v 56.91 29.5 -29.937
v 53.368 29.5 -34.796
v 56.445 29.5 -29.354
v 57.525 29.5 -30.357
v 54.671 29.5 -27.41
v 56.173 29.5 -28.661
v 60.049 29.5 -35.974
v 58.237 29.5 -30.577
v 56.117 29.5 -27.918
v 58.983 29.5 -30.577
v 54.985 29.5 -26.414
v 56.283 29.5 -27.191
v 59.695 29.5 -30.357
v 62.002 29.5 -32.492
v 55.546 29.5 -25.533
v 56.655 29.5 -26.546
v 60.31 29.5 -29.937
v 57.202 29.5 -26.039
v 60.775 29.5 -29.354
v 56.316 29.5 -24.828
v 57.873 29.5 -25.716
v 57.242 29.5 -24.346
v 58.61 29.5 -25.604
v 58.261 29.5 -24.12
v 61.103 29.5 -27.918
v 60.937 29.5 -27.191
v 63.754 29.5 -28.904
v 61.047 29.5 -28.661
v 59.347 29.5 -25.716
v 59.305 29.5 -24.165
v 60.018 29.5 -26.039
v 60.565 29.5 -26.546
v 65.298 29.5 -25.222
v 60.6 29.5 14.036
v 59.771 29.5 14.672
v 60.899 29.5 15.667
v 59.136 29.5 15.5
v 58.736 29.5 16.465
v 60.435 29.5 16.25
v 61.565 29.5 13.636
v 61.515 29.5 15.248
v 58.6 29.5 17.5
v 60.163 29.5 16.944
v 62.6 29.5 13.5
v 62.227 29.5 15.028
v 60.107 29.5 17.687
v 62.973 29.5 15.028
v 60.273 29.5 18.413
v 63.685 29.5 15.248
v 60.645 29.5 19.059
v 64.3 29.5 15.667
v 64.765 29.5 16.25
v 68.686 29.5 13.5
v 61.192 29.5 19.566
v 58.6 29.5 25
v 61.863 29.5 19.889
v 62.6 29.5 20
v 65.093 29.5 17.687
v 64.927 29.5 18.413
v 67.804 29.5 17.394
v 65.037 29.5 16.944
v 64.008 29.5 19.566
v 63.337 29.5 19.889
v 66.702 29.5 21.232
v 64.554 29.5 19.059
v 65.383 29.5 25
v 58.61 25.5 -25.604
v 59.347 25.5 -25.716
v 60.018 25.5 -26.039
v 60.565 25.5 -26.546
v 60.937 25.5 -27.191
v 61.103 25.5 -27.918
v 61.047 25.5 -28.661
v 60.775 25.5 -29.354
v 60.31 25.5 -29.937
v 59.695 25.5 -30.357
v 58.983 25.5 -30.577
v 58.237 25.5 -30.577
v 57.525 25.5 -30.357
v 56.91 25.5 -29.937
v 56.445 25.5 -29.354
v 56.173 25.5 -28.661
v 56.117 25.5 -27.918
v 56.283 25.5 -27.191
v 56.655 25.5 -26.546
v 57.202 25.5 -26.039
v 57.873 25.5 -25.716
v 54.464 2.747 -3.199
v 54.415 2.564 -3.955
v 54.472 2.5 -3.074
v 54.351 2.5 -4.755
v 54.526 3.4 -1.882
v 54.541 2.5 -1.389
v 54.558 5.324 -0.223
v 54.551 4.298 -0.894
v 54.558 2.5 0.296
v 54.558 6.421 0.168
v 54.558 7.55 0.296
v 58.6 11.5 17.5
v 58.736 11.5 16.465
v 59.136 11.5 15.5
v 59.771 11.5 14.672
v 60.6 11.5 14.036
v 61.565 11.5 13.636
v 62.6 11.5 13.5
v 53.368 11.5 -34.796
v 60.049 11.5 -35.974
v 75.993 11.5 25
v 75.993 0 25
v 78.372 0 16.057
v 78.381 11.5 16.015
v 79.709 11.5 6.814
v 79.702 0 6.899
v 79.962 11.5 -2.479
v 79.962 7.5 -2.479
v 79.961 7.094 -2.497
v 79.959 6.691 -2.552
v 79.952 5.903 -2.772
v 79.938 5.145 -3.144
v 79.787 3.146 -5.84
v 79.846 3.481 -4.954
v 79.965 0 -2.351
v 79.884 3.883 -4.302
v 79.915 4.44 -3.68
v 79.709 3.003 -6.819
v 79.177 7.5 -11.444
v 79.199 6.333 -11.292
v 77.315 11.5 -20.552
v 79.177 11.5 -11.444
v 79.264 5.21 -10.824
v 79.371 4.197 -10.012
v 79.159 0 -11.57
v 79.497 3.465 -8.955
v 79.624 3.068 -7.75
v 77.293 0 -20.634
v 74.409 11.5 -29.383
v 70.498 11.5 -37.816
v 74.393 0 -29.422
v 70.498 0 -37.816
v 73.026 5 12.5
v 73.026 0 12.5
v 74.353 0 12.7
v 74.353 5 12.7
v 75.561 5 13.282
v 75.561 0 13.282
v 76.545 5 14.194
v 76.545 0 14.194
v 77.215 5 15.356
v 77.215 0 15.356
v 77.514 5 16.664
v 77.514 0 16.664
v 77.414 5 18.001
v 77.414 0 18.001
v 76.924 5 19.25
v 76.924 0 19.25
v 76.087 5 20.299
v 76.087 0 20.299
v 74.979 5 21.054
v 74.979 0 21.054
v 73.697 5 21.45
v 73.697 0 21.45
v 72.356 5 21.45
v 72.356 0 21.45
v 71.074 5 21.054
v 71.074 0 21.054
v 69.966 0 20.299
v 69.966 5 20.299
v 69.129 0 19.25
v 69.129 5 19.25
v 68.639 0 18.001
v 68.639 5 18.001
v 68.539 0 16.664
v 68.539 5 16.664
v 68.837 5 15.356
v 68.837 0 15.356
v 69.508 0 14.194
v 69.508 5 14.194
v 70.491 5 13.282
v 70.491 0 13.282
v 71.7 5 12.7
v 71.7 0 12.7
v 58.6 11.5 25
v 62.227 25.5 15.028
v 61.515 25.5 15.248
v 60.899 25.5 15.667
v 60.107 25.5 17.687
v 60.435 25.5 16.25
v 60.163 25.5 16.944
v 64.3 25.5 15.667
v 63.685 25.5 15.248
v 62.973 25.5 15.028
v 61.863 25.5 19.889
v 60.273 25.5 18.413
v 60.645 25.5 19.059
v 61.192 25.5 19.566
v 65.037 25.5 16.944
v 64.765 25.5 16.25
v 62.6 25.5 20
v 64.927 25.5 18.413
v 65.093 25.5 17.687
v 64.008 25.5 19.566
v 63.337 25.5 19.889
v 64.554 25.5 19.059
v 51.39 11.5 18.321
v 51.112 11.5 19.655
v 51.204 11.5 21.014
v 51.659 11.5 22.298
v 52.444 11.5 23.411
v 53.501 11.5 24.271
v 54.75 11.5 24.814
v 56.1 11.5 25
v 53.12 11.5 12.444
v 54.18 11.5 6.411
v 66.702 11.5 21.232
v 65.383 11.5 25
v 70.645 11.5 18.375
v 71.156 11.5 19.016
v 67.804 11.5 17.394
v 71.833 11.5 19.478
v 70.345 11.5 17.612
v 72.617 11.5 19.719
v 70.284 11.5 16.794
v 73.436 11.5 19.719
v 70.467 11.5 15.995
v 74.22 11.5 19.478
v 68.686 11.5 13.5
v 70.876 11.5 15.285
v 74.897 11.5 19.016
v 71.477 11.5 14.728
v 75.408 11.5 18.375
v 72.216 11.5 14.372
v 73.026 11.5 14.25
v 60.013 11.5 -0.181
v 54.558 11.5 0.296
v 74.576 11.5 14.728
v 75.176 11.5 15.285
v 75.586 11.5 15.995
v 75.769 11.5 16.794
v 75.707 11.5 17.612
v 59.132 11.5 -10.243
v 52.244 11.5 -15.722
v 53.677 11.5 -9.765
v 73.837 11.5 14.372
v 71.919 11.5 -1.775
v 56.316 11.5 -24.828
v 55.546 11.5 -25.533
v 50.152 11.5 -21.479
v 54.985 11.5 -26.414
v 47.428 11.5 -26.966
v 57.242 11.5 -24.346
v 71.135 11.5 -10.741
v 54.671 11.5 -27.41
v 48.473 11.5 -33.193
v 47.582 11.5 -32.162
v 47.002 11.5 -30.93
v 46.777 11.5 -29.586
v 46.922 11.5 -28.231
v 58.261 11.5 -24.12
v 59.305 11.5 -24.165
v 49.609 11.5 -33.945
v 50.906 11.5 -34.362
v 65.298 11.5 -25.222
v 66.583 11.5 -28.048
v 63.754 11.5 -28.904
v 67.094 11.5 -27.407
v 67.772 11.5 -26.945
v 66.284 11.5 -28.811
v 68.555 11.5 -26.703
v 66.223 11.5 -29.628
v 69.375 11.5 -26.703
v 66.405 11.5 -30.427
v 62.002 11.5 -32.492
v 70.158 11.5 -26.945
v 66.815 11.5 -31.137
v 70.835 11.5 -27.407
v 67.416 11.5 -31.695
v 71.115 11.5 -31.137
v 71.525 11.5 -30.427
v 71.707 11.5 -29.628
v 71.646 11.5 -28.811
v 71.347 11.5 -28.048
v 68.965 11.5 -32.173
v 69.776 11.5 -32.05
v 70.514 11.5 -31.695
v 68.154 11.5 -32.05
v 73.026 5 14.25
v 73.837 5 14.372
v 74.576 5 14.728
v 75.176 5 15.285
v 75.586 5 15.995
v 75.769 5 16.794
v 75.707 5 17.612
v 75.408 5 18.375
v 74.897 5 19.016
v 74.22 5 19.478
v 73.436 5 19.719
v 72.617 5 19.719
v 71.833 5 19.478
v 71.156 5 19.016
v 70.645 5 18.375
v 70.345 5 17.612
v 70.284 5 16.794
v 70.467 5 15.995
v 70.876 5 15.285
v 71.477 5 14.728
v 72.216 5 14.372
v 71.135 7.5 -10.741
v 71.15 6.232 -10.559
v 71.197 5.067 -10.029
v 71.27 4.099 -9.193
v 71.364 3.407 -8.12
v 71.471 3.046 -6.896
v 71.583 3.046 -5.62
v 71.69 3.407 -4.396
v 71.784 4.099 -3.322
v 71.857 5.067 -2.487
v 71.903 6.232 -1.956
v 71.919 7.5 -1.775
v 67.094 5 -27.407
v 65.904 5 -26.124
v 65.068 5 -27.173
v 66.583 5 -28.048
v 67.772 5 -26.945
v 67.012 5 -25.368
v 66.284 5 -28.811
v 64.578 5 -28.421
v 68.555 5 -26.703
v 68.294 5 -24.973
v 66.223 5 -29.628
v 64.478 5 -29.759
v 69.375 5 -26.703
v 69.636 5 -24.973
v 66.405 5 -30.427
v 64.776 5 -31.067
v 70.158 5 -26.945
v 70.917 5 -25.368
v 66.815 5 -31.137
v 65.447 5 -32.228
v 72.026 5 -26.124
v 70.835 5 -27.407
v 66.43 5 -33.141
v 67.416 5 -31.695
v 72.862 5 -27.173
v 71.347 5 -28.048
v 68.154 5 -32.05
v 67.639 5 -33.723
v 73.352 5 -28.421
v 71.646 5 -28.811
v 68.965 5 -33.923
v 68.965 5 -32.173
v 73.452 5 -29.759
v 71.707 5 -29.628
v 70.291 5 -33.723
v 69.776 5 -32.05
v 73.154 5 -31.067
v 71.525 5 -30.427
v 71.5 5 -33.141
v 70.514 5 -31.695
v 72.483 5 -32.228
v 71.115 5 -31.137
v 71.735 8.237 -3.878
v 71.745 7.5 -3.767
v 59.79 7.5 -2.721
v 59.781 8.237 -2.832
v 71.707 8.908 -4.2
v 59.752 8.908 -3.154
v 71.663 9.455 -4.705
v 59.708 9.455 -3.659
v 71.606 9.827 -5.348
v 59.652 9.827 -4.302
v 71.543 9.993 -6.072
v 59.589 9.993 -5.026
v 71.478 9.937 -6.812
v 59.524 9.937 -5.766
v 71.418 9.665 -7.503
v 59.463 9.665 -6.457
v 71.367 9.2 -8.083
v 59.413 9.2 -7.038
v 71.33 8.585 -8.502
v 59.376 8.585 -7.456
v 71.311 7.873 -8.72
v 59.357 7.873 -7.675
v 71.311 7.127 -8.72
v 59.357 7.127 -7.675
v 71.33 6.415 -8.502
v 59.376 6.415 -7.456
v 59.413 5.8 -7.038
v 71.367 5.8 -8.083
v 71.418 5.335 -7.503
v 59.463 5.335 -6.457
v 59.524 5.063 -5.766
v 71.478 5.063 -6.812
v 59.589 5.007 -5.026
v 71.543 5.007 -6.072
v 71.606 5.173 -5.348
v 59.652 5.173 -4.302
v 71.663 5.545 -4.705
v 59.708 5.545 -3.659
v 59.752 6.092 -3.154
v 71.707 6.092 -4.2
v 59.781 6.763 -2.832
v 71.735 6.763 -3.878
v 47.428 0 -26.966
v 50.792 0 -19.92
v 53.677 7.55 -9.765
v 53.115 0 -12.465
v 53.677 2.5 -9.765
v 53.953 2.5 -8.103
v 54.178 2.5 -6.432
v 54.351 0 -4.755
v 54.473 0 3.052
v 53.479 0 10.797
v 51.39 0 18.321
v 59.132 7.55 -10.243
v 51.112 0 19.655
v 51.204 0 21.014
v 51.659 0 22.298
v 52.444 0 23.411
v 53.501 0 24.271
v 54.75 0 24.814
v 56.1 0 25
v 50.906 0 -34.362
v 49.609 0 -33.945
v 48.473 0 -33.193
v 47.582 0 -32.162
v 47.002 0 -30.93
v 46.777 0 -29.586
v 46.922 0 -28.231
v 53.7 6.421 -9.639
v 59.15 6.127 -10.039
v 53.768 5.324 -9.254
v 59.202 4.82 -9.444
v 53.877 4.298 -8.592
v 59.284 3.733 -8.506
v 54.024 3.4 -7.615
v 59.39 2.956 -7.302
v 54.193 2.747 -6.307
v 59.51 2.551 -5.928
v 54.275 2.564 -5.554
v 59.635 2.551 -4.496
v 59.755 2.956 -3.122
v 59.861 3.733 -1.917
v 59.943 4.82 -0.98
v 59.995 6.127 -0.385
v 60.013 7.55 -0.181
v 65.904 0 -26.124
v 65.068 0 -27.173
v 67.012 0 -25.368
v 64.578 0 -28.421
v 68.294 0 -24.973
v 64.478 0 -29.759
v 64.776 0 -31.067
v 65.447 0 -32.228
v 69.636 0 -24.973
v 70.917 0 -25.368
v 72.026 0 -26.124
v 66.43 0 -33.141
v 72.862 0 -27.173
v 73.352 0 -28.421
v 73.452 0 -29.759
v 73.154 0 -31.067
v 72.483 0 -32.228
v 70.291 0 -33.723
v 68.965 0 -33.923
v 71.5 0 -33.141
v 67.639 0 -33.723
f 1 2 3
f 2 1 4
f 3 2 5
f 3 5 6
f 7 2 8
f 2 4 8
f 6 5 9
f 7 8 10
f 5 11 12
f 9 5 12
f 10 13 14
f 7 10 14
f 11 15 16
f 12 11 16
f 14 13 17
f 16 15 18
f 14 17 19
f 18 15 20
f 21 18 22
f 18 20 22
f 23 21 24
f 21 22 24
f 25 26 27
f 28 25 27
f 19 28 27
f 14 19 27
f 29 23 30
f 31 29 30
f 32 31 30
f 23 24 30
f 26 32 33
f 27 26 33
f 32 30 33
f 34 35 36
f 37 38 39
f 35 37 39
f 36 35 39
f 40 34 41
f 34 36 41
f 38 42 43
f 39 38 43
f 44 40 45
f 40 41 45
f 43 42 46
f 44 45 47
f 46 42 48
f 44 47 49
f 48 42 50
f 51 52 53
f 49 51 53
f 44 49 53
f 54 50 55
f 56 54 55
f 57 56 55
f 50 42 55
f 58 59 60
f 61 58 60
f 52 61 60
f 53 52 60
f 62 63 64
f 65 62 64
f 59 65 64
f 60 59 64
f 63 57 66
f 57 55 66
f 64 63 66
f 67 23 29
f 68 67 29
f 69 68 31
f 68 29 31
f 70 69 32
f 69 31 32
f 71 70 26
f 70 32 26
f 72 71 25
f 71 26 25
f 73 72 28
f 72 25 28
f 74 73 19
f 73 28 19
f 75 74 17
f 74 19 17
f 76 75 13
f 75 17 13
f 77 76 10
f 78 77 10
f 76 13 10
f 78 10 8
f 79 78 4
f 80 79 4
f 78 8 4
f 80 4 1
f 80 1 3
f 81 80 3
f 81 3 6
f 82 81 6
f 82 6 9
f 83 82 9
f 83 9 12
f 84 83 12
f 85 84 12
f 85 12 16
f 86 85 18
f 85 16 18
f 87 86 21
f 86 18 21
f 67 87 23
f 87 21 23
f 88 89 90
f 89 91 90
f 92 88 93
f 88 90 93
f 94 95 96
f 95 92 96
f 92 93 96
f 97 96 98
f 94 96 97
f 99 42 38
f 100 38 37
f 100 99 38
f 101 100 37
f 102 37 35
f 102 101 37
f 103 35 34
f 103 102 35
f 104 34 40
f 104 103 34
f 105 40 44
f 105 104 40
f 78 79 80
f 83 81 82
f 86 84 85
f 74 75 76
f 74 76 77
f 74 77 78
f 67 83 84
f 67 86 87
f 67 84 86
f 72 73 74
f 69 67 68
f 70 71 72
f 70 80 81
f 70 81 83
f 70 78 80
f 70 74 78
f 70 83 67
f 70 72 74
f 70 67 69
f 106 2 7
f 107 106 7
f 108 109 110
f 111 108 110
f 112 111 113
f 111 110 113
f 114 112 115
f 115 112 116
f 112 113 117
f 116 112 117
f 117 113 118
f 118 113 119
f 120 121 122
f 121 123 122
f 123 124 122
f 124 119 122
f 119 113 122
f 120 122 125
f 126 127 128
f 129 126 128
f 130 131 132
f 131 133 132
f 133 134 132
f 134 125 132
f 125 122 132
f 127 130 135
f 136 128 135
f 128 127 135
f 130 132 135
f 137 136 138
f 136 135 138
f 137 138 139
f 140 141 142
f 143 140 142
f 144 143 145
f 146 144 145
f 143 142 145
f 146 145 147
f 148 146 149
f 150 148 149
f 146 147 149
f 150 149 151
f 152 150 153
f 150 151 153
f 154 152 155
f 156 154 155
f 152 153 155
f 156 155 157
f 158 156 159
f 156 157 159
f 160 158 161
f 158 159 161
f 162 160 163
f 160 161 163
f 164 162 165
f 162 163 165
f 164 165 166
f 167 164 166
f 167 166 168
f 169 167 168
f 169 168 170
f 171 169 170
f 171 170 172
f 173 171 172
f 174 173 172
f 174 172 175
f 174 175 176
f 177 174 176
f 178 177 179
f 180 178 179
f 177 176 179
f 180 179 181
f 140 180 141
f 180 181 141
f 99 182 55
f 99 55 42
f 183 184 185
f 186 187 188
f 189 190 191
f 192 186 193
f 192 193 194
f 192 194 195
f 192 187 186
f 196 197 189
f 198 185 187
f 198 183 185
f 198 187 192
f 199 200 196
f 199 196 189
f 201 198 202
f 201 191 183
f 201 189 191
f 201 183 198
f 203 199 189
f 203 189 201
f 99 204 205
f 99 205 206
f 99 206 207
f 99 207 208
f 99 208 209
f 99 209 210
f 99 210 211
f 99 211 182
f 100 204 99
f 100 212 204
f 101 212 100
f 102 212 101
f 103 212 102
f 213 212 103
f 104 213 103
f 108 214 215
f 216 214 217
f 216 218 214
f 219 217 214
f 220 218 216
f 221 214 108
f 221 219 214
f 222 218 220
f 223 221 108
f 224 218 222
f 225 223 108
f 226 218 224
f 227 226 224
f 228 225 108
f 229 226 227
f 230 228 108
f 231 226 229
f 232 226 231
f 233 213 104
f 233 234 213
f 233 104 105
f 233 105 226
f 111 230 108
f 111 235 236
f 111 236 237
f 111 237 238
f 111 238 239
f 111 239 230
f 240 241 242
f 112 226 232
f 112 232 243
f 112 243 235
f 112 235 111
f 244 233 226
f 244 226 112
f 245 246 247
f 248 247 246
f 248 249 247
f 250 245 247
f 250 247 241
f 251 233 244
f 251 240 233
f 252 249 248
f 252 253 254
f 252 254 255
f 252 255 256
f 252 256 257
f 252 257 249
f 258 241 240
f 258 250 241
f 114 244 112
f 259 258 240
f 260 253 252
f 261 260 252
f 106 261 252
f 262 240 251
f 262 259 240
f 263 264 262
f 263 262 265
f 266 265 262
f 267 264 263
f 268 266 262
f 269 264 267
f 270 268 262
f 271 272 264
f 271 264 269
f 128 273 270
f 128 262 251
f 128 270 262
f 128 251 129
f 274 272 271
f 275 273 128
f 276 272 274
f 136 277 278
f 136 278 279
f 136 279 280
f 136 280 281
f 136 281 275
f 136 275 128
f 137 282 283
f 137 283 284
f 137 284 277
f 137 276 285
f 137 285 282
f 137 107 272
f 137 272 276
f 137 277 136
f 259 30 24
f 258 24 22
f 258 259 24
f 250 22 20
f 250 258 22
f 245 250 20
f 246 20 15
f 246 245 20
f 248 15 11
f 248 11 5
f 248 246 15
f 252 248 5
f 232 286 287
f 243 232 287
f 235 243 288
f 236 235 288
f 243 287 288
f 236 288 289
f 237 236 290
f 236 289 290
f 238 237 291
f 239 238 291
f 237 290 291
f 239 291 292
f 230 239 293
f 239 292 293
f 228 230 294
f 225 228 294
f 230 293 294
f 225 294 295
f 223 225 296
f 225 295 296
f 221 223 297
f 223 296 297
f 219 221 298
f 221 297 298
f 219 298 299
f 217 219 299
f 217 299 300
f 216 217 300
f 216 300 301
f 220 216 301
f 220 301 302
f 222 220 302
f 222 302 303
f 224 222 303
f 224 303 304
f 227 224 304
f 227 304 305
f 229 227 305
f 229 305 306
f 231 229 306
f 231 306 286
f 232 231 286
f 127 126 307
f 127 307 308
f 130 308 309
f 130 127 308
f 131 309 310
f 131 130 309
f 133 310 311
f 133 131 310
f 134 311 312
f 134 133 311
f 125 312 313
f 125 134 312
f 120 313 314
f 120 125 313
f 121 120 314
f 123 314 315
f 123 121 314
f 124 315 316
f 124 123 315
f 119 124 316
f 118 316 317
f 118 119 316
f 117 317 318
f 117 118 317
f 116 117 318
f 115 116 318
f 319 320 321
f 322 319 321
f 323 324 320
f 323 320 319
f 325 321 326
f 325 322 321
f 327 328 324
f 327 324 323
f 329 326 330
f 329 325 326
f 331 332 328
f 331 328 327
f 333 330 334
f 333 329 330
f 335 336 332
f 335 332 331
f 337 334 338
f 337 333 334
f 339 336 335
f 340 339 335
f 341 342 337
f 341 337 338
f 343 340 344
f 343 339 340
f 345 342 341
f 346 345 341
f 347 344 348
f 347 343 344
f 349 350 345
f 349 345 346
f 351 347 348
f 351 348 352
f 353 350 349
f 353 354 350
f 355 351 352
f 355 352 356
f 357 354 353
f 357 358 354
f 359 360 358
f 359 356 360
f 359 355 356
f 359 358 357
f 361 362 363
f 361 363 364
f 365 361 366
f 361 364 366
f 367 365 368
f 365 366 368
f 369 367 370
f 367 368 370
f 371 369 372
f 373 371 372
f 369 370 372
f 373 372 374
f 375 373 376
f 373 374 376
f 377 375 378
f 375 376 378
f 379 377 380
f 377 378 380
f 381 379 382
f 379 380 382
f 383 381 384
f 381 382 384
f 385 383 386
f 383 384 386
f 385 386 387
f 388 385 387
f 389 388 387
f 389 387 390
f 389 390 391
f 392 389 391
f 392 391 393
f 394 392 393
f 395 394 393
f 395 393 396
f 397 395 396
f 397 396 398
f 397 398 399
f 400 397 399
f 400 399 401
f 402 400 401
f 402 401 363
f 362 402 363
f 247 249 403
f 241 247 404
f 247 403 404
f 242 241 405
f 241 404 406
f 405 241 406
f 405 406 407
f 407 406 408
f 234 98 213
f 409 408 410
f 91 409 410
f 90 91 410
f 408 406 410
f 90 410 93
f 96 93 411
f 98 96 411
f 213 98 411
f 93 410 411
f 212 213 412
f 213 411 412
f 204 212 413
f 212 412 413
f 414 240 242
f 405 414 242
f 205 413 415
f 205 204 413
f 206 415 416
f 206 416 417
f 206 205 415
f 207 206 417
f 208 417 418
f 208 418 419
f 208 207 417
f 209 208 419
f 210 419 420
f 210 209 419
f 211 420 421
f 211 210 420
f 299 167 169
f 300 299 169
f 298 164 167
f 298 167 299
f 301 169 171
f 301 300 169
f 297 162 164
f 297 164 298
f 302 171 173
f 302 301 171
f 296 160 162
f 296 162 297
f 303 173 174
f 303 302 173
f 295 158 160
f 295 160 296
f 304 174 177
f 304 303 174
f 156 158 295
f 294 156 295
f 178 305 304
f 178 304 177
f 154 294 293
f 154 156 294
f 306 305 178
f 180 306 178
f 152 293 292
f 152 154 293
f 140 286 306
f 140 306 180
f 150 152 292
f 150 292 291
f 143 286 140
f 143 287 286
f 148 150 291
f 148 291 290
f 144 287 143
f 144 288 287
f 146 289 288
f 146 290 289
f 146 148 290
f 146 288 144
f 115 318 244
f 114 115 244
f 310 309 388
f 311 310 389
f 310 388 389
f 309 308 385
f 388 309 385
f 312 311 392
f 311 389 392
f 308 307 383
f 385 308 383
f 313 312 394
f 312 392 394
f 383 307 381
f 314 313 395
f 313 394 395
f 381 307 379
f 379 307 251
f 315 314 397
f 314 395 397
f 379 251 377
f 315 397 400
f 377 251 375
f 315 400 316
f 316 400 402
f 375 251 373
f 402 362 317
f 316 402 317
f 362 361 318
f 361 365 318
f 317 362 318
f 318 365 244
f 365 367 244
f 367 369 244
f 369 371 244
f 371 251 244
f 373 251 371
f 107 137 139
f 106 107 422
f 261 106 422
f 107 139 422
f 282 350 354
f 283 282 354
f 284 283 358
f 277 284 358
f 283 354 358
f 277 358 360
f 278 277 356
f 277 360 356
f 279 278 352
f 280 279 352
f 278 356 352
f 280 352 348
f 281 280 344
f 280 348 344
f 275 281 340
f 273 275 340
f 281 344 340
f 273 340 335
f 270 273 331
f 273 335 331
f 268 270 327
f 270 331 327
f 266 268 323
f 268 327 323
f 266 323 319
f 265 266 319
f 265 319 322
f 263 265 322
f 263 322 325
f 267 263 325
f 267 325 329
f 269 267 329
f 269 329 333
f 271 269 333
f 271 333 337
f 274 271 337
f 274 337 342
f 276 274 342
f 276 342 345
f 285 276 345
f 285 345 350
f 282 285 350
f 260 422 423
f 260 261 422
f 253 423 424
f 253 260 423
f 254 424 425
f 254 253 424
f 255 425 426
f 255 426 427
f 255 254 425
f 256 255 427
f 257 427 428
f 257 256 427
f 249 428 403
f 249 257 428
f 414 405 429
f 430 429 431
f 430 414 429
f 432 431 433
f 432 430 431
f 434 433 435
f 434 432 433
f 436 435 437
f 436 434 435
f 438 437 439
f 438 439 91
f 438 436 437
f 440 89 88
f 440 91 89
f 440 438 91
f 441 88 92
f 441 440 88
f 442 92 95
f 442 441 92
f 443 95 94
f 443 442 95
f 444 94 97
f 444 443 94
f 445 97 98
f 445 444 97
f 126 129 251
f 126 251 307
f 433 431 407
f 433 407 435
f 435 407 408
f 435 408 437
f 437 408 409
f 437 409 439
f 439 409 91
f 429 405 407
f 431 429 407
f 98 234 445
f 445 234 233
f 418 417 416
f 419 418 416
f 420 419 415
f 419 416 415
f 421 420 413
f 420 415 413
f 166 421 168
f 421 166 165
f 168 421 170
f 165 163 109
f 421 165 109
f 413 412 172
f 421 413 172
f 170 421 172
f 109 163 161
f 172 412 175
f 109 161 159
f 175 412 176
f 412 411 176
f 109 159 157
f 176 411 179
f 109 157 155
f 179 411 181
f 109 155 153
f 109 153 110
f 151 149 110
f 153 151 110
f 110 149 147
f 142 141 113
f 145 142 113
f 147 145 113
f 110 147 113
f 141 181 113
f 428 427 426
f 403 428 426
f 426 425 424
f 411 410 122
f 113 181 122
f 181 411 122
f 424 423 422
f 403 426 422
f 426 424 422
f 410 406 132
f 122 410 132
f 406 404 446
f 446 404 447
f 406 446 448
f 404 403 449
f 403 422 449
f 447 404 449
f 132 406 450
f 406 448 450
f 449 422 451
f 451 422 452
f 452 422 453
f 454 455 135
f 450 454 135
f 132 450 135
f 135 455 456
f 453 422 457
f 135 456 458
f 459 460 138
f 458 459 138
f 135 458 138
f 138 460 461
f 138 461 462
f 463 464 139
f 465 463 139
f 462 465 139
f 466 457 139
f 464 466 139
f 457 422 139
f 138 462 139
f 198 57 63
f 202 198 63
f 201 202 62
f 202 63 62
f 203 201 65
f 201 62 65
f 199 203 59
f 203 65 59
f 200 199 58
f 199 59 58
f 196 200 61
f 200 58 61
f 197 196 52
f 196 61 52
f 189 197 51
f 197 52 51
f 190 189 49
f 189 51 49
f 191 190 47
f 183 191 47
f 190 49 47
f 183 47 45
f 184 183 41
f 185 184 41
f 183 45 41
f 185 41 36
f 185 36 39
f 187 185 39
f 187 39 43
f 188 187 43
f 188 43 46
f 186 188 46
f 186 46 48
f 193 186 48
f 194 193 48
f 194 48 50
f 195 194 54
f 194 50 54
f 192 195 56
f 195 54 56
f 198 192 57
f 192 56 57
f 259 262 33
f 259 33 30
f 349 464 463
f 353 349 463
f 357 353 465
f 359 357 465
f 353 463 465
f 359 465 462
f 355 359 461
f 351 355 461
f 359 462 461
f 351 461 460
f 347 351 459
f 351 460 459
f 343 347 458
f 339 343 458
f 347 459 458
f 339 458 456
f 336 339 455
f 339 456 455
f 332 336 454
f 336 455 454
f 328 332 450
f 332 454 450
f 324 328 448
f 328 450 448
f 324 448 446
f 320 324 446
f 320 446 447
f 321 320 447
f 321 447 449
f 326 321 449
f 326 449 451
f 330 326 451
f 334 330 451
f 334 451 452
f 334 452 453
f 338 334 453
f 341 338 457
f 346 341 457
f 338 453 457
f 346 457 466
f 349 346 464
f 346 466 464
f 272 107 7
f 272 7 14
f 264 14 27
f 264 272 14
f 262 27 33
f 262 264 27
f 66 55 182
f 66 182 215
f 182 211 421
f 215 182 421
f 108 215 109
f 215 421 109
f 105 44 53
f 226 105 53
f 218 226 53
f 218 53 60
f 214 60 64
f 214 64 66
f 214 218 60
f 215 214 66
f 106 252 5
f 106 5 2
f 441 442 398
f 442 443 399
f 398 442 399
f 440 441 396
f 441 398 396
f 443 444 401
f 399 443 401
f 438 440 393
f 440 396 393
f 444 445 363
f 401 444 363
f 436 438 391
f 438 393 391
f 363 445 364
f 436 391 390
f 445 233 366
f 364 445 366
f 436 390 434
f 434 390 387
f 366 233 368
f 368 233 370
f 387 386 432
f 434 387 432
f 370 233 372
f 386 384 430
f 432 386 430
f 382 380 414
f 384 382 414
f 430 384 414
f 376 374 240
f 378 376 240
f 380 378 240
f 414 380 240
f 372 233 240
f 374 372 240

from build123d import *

# Parameters (mm, degrees)
BOSS_EXTRUDE1_DEPTH = 11.5
SKETCH4_R           = 4.5
CUT_EXTRUDE2_DEPTH  = 5
SKETCH5_R           = 2.75
CUT_EXTRUDE3_DEPTH  = 89.726115198
SKETCH6_R           = 2.5
CUT_EXTRUDE4_DEPTH  = 50.330582837
CUT_EXTRUDE5_DEPTH  = 8.2
CUT_EXTRUDE6_DEPTH  = 9
FILLET1_R           = 5.05
FILLET2_R           = 5
BOSS_EXTRUDE2_DEPTH = 18
SKETCH3_R           = 2.5
CUT_EXTRUDE1_DEPTH  = 4


with BuildPart() as part:
    # Sketch1 → Boss-Extrude1 (new body)
    with BuildSketch(Plane(origin=(0, 0, 0), x_dir=(1, 0, 0), z_dir=(0, 1, 0))):
        with BuildLine():
            Line((48.493420768, -25), (75.993420768, -25))
            ThreePointArc((75.993420768, -25), (79.695575847, 6.97245942), (70.497705508, 37.816312856))
            Line((70.497705508, 37.816312856), (43.415492301, 33.04098797))
            ThreePointArc((43.415492301, 33.04098797), (54.350723514, 4.755072162), (48.493420768, -25))
        make_face()
    extrude(amount=BOSS_EXTRUDE1_DEPTH)

    # Sketch4 → Cut-Extrude2 (cut)
    with BuildSketch(Plane.XZ):
        with Locations(Location((73.026415161, 17, 0), (0, 0, 270))):
            Circle(SKETCH4_R)
        with Locations(Location((68.964960805, -29.422635715, 0), (0, 0, 270))):
            Circle(SKETCH4_R)
    extrude(amount=-CUT_EXTRUDE2_DEPTH, mode=Mode.SUBTRACT)

    # Sketch5 → Cut-Extrude3 (cut, through all)
    with BuildSketch(Plane.XZ.offset(-5)):
        with Locations(Location((73.026415161, 17, 0), (0, 0, 270))):
            Circle(SKETCH5_R)
        with Locations(Location((68.964960805, -29.422635715, 0), (0, 0, 270))):
            Circle(SKETCH5_R)
    extrude(amount=-CUT_EXTRUDE3_DEPTH, mode=Mode.SUBTRACT)

    # Sketch6 → Cut-Extrude4 (cut, through all)
    with BuildSketch(Plane(origin=(45.954456534, 0, -4.020493985), x_dir=(0.08715574274765857, 0, 0.9961946980917455), z_dir=(-0.9961946980917455, 0, 0.08715574274765857))):
        with Locations((0, 7.5)):
            Circle(SKETCH6_R)
    extrude(amount=-CUT_EXTRUDE4_DEPTH, mode=Mode.SUBTRACT)

    # Sketch8 → Cut-Extrude5 (cut)
    with BuildSketch(Plane(origin=(79.695575847, 0, -6.97245942), x_dir=(-0.08715574274765857, 0, -0.9961946980917455), z_dir=(0.9961946980917455, 0, -0.08715574274765857))):
        with BuildLine():
            Line((-4.5, 7.5), (-4.5, 11.5))
            Line((-4.5, 11.5), (4.5, 11.5))
            Line((4.5, 11.5), (4.5, 7.5))
            ThreePointArc((4.5, 7.5), (0, 3), (-4.5, 7.5))
        make_face()
    extrude(amount=-CUT_EXTRUDE5_DEPTH, mode=Mode.SUBTRACT)

    # Sketch7 → Cut-Extrude6 (cut)
    with BuildSketch(Plane(origin=(0, 11.5, 0), x_dir=(1, 0, 0), z_dir=(0, 1, 0))):
        Polygon((51.16274886, 9.5454507), (52.043021862, -0.516115751), (60.012579447, 0.181130191), (59.132306445, 10.242696642), align=None)
    extrude(amount=-CUT_EXTRUDE6_DEPTH, mode=Mode.SUBTRACT)

    # Fillet1
    # the kernel refuses this fillet: 5.05 mm, written as the material it adds along each edge
    with BuildSketch(Plane(origin=(41.980572745, 2.5, 1.396465976), x_dir=(0, 1, 0), z_dir=(0.9961946980917454, 0, -0.08715574274765918))) as fillet1_piece_1_section:
        with BuildLine():
            CenterArc((FILLET1_R, -FILLET1_R), FILLET1_R, 90, 90)
            Line((0, -FILLET1_R), (0, 0))
            Line((0, 0), (FILLET1_R, 0))
        make_face()
    fillet1_piece_1 = extrude(amount=30.725886038, mode=Mode.PRIVATE)
    fillet1_piece_1 = fillet1_piece_1 - Plane(origin=(0, 3.651800065, 0), x_dir=(0.7957627874759549, 0, -0.6056084428642803), z_dir=(0, -1, 0)) * Cylinder(54.558334448, 82, mode=Mode.PRIVATE)
    add(fillet1_piece_1)
    with BuildSketch(Plane(origin=(71.709264508, 2.5, -11.343037894), x_dir=(0.08715574274765941, 0, 0.9961946980917454), z_dir=(-0.9961946980917455, 0, 0.08715574274765941))) as fillet1_piece_2_section:
        with BuildLine():
            CenterArc((FILLET1_R, FILLET1_R), FILLET1_R, 180, 90)
            Line((0, FILLET1_R), (0, 0))
            Line((0, 0), (FILLET1_R, 0))
        make_face()
    fillet1_piece_2 = extrude(amount=30.725886038, mode=Mode.PRIVATE)
    fillet1_piece_2 = fillet1_piece_2 - Plane(origin=(0, 3.643295327, 0), x_dir=(0.7957627874759549, 0, -0.6056084428642803), z_dir=(0, -1, 0)) * Cylinder(54.558334448, 82, mode=Mode.PRIVATE)
    add(fillet1_piece_2)

    # Fillet2
    fillet2_edges = [part.edges().sort_by_distance(p)[0] for p in [
        (48.493420768, 5.75, 25),
        (43.415492301, 5.75, -33.04098797),
    ]]
    fillet(fillet2_edges, radius=FILLET2_R)

    # Sketch2 → Boss-Extrude2 (add)
    with BuildSketch(Plane.XZ.offset(-11.5)):
        with BuildLine():
            Line((62.599920128, 13.5), (68.685879189, 13.5))
            ThreePointArc((68.685879189, 13.5), (67.280837144, 19.320687184), (65.383484153, 25))
            Line((65.383484153, 25), (58.599920128, 25))
            Line((58.599920128, 25), (58.599920128, 17.5))
            ThreePointArc((58.599920128, 17.5), (59.771493003, 14.671572875), (62.599920128, 13.5))
        make_face()
        with BuildLine():
            Line((54.670812559, -27.409905019), (53.368451226, -34.795963167))
            Line((53.368451226, -34.795963167), (60.048957671, -35.973916698))
            ThreePointArc((60.048957671, -35.973916698), (62.903687928, -30.710357294), (65.29813595, -25.222082418))
            Line((65.29813595, -25.222082418), (59.304636281, -24.165266718))
            ThreePointArc((59.304636281, -24.165266718), (56.315737825, -24.827889553), (54.670812559, -27.409905019))
        make_face()
    extrude(amount=-BOSS_EXTRUDE2_DEPTH)

    # Sketch3 → Cut-Extrude1 (cut)
    with BuildSketch(Plane(origin=(0, 29.5, 0), x_dir=(1, 0, 0), z_dir=(0, 1, 0))):
        with Locations(Location((58.610043571, 28.10449773, 0), (0, 0, 270))):
            Circle(SKETCH3_R)
        with Locations(Location((62.599920128, -17.5, 0), (0, 0, 270))):
            Circle(SKETCH3_R)
    extrude(amount=-CUT_EXTRUDE1_DEPTH, mode=Mode.SUBTRACT)


solid = part.part
